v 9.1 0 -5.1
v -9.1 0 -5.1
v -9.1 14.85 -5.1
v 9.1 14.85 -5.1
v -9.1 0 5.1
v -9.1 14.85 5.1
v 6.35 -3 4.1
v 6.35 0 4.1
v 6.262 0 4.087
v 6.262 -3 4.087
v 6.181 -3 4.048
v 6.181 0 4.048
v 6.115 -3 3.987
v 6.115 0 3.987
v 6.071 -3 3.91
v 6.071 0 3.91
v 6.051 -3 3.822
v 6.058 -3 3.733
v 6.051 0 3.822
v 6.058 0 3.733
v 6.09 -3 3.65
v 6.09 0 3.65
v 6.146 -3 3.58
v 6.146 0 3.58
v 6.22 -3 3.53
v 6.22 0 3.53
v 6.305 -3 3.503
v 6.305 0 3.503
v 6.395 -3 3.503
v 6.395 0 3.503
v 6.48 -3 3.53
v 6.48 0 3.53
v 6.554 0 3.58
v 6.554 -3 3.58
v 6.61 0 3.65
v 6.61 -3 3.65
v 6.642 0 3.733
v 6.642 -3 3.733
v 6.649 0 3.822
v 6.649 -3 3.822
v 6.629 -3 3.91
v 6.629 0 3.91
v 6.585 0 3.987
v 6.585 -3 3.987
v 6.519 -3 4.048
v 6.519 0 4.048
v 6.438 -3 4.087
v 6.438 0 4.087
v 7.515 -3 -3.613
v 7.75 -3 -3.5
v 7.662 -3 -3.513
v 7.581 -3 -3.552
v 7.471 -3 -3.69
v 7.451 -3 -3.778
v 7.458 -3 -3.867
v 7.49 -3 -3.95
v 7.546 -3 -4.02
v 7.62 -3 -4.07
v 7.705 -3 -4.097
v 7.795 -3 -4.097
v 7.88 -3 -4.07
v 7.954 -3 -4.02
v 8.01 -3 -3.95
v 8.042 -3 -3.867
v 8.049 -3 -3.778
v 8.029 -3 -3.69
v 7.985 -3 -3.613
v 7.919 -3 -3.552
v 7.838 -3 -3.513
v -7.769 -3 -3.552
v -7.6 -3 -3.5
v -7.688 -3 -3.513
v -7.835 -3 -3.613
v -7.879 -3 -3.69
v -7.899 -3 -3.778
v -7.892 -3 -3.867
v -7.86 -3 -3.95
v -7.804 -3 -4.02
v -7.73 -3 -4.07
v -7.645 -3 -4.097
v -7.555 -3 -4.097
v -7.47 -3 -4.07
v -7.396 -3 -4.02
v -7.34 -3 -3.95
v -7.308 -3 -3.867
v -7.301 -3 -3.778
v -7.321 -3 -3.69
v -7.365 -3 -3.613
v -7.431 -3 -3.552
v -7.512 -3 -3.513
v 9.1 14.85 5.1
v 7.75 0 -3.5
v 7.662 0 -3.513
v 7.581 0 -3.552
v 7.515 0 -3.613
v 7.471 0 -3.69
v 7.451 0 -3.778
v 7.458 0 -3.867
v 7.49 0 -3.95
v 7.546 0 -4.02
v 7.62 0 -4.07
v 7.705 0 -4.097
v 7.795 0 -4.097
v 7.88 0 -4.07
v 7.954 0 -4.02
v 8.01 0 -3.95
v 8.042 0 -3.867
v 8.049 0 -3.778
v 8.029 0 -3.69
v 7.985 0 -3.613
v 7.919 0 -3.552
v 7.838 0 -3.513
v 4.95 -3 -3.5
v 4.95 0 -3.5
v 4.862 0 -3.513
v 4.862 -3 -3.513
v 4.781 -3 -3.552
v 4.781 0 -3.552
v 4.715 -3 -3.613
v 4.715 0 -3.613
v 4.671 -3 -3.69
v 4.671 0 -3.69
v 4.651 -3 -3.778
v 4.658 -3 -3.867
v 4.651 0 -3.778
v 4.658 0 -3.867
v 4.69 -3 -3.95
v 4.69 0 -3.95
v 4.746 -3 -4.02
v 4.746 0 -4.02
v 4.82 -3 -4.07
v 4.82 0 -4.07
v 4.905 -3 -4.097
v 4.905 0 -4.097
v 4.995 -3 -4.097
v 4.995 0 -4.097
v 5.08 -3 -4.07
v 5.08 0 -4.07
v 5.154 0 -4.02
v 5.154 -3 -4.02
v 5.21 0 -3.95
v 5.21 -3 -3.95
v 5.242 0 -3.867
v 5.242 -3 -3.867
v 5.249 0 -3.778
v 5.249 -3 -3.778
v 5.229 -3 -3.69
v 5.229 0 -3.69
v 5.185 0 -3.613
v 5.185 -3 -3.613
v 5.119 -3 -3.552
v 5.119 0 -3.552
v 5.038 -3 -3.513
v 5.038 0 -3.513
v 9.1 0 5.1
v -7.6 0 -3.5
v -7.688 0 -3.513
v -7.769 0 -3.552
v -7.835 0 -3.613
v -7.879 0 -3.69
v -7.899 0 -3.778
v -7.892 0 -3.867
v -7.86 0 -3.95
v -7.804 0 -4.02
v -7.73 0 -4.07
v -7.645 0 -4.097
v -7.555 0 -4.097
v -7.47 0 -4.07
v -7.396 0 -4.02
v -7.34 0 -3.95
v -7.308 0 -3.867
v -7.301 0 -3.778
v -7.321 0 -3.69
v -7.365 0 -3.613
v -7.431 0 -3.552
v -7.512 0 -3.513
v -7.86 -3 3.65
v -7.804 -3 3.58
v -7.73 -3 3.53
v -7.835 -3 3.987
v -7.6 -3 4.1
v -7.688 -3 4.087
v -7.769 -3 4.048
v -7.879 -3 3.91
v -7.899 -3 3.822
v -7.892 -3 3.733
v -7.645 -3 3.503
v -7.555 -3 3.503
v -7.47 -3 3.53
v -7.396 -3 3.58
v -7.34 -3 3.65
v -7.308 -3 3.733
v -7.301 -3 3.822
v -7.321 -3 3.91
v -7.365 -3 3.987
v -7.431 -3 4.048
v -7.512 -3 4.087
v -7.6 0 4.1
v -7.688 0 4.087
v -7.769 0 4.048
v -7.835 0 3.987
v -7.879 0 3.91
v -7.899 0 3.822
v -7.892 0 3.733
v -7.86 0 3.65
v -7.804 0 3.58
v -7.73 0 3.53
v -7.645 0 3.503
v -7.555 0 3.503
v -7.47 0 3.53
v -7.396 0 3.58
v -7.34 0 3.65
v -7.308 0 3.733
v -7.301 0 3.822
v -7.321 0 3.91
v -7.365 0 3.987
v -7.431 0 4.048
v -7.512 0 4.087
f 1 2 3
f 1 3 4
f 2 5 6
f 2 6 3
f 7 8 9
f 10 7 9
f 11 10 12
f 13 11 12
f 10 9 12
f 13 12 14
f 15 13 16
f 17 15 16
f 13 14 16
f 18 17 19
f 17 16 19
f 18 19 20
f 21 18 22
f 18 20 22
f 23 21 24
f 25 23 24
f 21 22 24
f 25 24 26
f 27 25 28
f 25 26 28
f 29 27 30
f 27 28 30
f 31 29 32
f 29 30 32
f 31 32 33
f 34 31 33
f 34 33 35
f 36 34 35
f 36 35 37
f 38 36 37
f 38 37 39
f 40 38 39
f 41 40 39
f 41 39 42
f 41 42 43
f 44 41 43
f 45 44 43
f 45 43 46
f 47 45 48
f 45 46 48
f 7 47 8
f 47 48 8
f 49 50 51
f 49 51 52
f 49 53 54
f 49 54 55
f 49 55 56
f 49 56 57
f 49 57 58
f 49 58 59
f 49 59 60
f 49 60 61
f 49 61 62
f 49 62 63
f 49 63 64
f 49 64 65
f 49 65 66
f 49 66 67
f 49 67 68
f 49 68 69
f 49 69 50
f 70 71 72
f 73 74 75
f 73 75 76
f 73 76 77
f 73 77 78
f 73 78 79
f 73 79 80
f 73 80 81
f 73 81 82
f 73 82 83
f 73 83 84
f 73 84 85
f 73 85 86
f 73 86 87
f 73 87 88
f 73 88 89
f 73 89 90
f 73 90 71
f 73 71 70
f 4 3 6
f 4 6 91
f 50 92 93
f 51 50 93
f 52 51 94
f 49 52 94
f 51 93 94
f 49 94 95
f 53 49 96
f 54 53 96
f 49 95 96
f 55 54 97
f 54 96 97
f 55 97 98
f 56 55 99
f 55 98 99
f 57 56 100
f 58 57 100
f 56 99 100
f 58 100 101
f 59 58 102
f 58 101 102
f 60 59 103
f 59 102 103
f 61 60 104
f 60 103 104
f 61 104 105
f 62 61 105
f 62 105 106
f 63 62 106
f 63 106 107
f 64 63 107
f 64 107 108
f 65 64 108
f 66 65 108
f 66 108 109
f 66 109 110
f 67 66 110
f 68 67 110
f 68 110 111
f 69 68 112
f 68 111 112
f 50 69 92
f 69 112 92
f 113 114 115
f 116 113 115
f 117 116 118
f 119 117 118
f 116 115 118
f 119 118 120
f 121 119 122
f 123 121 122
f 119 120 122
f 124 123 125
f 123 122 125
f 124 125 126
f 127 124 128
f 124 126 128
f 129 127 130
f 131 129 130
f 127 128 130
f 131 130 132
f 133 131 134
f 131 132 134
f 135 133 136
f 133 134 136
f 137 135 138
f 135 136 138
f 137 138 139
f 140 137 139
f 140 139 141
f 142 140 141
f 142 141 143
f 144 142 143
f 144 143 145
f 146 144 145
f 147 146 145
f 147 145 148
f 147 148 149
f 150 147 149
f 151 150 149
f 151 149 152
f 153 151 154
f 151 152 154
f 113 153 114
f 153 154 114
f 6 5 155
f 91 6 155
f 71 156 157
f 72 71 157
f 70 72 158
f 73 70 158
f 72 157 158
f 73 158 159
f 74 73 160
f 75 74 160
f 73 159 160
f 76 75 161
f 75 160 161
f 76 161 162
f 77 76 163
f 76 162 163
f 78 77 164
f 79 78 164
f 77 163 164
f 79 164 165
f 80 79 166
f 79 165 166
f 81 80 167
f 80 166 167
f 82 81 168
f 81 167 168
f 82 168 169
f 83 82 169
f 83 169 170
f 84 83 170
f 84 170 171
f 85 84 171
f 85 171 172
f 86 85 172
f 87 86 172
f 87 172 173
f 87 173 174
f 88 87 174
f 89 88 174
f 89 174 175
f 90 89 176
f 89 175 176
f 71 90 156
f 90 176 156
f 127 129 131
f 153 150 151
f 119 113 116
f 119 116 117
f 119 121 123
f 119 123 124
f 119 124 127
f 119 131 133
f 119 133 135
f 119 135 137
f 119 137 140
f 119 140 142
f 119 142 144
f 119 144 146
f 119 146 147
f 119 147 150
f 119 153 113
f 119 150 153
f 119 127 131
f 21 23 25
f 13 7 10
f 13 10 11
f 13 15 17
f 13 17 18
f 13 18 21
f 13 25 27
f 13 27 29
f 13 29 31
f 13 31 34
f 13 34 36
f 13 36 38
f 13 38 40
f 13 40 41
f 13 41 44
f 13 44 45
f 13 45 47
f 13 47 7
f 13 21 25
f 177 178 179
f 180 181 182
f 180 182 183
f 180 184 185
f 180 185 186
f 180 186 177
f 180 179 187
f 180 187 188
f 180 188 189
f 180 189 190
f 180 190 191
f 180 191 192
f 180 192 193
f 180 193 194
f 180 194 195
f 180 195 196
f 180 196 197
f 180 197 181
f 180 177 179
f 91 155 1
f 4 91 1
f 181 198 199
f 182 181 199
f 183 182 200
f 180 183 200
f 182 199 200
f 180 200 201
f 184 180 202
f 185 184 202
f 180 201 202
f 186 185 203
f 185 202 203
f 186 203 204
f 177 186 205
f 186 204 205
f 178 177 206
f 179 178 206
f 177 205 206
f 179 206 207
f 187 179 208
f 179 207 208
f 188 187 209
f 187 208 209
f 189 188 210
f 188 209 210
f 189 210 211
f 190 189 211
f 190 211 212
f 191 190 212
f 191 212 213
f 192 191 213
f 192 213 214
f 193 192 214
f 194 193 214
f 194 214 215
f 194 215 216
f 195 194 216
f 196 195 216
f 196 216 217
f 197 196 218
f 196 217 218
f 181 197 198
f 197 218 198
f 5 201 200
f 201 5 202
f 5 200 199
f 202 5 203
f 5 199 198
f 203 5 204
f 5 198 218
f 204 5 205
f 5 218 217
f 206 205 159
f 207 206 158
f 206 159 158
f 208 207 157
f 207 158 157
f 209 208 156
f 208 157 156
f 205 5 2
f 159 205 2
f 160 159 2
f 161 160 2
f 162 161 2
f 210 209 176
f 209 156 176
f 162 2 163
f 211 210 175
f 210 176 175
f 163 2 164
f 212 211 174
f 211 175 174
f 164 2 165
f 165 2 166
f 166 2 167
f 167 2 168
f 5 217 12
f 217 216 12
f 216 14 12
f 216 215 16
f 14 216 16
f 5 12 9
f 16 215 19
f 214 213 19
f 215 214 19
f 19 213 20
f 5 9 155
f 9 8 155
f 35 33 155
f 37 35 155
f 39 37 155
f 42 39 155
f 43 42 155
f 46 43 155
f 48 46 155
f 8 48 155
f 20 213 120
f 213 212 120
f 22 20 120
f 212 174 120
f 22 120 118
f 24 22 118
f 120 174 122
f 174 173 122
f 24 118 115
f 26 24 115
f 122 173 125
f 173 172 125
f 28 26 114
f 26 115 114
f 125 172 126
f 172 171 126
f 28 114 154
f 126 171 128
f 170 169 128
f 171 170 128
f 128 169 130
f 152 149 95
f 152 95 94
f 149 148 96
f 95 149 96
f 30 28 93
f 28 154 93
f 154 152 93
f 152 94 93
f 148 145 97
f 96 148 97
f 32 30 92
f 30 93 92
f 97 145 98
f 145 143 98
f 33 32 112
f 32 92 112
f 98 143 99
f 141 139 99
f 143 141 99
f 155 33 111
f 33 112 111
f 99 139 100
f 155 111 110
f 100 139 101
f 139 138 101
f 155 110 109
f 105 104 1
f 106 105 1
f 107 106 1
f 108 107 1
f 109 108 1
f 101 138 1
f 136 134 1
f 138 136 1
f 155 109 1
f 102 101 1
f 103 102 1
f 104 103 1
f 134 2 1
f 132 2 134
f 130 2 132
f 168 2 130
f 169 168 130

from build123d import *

# Parameters (mm, degrees)
SKETCH_1_W      = 18.2
SKETCH_1_H      = 10.2
EXTRUDE_1_DEPTH = 14.85
SKETCH_3_R      = 0.3
EXTRUDE_2_DEPTH = 3


with BuildPart() as part:
    # Эскиз1 → Бобышка-Вытянуть1 (new body)
    with BuildSketch(Plane(origin=(0, 0, 0), x_dir=(1, 0, 0), z_dir=(0, 1, 0))):
        Rectangle(SKETCH_1_W, SKETCH_1_H)
    extrude(amount=EXTRUDE_1_DEPTH)

    # Эскиз3 → Бобышка-Вытянуть2 (add)
    with BuildSketch(Plane.XZ):
        with Locations(Location((-7.6, 3.8, 0), (0, 0, 90))):
            Circle(SKETCH_3_R)
        with Locations(Location((-7.6, -3.8, 0), (0, 0, 90))):
            Circle(SKETCH_3_R)
        with Locations(Location((6.35, 3.8, 0), (0, 0, 90))):
            Circle(SKETCH_3_R)
        with Locations(Location((4.95, -3.8, 0), (0, 0, 90))):
            Circle(SKETCH_3_R)
        with Locations(Location((7.75, -3.8, 0), (0, 0, 90))):
            Circle(SKETCH_3_R)
    extrude(amount=EXTRUDE_2_DEPTH)


solid = part.part
